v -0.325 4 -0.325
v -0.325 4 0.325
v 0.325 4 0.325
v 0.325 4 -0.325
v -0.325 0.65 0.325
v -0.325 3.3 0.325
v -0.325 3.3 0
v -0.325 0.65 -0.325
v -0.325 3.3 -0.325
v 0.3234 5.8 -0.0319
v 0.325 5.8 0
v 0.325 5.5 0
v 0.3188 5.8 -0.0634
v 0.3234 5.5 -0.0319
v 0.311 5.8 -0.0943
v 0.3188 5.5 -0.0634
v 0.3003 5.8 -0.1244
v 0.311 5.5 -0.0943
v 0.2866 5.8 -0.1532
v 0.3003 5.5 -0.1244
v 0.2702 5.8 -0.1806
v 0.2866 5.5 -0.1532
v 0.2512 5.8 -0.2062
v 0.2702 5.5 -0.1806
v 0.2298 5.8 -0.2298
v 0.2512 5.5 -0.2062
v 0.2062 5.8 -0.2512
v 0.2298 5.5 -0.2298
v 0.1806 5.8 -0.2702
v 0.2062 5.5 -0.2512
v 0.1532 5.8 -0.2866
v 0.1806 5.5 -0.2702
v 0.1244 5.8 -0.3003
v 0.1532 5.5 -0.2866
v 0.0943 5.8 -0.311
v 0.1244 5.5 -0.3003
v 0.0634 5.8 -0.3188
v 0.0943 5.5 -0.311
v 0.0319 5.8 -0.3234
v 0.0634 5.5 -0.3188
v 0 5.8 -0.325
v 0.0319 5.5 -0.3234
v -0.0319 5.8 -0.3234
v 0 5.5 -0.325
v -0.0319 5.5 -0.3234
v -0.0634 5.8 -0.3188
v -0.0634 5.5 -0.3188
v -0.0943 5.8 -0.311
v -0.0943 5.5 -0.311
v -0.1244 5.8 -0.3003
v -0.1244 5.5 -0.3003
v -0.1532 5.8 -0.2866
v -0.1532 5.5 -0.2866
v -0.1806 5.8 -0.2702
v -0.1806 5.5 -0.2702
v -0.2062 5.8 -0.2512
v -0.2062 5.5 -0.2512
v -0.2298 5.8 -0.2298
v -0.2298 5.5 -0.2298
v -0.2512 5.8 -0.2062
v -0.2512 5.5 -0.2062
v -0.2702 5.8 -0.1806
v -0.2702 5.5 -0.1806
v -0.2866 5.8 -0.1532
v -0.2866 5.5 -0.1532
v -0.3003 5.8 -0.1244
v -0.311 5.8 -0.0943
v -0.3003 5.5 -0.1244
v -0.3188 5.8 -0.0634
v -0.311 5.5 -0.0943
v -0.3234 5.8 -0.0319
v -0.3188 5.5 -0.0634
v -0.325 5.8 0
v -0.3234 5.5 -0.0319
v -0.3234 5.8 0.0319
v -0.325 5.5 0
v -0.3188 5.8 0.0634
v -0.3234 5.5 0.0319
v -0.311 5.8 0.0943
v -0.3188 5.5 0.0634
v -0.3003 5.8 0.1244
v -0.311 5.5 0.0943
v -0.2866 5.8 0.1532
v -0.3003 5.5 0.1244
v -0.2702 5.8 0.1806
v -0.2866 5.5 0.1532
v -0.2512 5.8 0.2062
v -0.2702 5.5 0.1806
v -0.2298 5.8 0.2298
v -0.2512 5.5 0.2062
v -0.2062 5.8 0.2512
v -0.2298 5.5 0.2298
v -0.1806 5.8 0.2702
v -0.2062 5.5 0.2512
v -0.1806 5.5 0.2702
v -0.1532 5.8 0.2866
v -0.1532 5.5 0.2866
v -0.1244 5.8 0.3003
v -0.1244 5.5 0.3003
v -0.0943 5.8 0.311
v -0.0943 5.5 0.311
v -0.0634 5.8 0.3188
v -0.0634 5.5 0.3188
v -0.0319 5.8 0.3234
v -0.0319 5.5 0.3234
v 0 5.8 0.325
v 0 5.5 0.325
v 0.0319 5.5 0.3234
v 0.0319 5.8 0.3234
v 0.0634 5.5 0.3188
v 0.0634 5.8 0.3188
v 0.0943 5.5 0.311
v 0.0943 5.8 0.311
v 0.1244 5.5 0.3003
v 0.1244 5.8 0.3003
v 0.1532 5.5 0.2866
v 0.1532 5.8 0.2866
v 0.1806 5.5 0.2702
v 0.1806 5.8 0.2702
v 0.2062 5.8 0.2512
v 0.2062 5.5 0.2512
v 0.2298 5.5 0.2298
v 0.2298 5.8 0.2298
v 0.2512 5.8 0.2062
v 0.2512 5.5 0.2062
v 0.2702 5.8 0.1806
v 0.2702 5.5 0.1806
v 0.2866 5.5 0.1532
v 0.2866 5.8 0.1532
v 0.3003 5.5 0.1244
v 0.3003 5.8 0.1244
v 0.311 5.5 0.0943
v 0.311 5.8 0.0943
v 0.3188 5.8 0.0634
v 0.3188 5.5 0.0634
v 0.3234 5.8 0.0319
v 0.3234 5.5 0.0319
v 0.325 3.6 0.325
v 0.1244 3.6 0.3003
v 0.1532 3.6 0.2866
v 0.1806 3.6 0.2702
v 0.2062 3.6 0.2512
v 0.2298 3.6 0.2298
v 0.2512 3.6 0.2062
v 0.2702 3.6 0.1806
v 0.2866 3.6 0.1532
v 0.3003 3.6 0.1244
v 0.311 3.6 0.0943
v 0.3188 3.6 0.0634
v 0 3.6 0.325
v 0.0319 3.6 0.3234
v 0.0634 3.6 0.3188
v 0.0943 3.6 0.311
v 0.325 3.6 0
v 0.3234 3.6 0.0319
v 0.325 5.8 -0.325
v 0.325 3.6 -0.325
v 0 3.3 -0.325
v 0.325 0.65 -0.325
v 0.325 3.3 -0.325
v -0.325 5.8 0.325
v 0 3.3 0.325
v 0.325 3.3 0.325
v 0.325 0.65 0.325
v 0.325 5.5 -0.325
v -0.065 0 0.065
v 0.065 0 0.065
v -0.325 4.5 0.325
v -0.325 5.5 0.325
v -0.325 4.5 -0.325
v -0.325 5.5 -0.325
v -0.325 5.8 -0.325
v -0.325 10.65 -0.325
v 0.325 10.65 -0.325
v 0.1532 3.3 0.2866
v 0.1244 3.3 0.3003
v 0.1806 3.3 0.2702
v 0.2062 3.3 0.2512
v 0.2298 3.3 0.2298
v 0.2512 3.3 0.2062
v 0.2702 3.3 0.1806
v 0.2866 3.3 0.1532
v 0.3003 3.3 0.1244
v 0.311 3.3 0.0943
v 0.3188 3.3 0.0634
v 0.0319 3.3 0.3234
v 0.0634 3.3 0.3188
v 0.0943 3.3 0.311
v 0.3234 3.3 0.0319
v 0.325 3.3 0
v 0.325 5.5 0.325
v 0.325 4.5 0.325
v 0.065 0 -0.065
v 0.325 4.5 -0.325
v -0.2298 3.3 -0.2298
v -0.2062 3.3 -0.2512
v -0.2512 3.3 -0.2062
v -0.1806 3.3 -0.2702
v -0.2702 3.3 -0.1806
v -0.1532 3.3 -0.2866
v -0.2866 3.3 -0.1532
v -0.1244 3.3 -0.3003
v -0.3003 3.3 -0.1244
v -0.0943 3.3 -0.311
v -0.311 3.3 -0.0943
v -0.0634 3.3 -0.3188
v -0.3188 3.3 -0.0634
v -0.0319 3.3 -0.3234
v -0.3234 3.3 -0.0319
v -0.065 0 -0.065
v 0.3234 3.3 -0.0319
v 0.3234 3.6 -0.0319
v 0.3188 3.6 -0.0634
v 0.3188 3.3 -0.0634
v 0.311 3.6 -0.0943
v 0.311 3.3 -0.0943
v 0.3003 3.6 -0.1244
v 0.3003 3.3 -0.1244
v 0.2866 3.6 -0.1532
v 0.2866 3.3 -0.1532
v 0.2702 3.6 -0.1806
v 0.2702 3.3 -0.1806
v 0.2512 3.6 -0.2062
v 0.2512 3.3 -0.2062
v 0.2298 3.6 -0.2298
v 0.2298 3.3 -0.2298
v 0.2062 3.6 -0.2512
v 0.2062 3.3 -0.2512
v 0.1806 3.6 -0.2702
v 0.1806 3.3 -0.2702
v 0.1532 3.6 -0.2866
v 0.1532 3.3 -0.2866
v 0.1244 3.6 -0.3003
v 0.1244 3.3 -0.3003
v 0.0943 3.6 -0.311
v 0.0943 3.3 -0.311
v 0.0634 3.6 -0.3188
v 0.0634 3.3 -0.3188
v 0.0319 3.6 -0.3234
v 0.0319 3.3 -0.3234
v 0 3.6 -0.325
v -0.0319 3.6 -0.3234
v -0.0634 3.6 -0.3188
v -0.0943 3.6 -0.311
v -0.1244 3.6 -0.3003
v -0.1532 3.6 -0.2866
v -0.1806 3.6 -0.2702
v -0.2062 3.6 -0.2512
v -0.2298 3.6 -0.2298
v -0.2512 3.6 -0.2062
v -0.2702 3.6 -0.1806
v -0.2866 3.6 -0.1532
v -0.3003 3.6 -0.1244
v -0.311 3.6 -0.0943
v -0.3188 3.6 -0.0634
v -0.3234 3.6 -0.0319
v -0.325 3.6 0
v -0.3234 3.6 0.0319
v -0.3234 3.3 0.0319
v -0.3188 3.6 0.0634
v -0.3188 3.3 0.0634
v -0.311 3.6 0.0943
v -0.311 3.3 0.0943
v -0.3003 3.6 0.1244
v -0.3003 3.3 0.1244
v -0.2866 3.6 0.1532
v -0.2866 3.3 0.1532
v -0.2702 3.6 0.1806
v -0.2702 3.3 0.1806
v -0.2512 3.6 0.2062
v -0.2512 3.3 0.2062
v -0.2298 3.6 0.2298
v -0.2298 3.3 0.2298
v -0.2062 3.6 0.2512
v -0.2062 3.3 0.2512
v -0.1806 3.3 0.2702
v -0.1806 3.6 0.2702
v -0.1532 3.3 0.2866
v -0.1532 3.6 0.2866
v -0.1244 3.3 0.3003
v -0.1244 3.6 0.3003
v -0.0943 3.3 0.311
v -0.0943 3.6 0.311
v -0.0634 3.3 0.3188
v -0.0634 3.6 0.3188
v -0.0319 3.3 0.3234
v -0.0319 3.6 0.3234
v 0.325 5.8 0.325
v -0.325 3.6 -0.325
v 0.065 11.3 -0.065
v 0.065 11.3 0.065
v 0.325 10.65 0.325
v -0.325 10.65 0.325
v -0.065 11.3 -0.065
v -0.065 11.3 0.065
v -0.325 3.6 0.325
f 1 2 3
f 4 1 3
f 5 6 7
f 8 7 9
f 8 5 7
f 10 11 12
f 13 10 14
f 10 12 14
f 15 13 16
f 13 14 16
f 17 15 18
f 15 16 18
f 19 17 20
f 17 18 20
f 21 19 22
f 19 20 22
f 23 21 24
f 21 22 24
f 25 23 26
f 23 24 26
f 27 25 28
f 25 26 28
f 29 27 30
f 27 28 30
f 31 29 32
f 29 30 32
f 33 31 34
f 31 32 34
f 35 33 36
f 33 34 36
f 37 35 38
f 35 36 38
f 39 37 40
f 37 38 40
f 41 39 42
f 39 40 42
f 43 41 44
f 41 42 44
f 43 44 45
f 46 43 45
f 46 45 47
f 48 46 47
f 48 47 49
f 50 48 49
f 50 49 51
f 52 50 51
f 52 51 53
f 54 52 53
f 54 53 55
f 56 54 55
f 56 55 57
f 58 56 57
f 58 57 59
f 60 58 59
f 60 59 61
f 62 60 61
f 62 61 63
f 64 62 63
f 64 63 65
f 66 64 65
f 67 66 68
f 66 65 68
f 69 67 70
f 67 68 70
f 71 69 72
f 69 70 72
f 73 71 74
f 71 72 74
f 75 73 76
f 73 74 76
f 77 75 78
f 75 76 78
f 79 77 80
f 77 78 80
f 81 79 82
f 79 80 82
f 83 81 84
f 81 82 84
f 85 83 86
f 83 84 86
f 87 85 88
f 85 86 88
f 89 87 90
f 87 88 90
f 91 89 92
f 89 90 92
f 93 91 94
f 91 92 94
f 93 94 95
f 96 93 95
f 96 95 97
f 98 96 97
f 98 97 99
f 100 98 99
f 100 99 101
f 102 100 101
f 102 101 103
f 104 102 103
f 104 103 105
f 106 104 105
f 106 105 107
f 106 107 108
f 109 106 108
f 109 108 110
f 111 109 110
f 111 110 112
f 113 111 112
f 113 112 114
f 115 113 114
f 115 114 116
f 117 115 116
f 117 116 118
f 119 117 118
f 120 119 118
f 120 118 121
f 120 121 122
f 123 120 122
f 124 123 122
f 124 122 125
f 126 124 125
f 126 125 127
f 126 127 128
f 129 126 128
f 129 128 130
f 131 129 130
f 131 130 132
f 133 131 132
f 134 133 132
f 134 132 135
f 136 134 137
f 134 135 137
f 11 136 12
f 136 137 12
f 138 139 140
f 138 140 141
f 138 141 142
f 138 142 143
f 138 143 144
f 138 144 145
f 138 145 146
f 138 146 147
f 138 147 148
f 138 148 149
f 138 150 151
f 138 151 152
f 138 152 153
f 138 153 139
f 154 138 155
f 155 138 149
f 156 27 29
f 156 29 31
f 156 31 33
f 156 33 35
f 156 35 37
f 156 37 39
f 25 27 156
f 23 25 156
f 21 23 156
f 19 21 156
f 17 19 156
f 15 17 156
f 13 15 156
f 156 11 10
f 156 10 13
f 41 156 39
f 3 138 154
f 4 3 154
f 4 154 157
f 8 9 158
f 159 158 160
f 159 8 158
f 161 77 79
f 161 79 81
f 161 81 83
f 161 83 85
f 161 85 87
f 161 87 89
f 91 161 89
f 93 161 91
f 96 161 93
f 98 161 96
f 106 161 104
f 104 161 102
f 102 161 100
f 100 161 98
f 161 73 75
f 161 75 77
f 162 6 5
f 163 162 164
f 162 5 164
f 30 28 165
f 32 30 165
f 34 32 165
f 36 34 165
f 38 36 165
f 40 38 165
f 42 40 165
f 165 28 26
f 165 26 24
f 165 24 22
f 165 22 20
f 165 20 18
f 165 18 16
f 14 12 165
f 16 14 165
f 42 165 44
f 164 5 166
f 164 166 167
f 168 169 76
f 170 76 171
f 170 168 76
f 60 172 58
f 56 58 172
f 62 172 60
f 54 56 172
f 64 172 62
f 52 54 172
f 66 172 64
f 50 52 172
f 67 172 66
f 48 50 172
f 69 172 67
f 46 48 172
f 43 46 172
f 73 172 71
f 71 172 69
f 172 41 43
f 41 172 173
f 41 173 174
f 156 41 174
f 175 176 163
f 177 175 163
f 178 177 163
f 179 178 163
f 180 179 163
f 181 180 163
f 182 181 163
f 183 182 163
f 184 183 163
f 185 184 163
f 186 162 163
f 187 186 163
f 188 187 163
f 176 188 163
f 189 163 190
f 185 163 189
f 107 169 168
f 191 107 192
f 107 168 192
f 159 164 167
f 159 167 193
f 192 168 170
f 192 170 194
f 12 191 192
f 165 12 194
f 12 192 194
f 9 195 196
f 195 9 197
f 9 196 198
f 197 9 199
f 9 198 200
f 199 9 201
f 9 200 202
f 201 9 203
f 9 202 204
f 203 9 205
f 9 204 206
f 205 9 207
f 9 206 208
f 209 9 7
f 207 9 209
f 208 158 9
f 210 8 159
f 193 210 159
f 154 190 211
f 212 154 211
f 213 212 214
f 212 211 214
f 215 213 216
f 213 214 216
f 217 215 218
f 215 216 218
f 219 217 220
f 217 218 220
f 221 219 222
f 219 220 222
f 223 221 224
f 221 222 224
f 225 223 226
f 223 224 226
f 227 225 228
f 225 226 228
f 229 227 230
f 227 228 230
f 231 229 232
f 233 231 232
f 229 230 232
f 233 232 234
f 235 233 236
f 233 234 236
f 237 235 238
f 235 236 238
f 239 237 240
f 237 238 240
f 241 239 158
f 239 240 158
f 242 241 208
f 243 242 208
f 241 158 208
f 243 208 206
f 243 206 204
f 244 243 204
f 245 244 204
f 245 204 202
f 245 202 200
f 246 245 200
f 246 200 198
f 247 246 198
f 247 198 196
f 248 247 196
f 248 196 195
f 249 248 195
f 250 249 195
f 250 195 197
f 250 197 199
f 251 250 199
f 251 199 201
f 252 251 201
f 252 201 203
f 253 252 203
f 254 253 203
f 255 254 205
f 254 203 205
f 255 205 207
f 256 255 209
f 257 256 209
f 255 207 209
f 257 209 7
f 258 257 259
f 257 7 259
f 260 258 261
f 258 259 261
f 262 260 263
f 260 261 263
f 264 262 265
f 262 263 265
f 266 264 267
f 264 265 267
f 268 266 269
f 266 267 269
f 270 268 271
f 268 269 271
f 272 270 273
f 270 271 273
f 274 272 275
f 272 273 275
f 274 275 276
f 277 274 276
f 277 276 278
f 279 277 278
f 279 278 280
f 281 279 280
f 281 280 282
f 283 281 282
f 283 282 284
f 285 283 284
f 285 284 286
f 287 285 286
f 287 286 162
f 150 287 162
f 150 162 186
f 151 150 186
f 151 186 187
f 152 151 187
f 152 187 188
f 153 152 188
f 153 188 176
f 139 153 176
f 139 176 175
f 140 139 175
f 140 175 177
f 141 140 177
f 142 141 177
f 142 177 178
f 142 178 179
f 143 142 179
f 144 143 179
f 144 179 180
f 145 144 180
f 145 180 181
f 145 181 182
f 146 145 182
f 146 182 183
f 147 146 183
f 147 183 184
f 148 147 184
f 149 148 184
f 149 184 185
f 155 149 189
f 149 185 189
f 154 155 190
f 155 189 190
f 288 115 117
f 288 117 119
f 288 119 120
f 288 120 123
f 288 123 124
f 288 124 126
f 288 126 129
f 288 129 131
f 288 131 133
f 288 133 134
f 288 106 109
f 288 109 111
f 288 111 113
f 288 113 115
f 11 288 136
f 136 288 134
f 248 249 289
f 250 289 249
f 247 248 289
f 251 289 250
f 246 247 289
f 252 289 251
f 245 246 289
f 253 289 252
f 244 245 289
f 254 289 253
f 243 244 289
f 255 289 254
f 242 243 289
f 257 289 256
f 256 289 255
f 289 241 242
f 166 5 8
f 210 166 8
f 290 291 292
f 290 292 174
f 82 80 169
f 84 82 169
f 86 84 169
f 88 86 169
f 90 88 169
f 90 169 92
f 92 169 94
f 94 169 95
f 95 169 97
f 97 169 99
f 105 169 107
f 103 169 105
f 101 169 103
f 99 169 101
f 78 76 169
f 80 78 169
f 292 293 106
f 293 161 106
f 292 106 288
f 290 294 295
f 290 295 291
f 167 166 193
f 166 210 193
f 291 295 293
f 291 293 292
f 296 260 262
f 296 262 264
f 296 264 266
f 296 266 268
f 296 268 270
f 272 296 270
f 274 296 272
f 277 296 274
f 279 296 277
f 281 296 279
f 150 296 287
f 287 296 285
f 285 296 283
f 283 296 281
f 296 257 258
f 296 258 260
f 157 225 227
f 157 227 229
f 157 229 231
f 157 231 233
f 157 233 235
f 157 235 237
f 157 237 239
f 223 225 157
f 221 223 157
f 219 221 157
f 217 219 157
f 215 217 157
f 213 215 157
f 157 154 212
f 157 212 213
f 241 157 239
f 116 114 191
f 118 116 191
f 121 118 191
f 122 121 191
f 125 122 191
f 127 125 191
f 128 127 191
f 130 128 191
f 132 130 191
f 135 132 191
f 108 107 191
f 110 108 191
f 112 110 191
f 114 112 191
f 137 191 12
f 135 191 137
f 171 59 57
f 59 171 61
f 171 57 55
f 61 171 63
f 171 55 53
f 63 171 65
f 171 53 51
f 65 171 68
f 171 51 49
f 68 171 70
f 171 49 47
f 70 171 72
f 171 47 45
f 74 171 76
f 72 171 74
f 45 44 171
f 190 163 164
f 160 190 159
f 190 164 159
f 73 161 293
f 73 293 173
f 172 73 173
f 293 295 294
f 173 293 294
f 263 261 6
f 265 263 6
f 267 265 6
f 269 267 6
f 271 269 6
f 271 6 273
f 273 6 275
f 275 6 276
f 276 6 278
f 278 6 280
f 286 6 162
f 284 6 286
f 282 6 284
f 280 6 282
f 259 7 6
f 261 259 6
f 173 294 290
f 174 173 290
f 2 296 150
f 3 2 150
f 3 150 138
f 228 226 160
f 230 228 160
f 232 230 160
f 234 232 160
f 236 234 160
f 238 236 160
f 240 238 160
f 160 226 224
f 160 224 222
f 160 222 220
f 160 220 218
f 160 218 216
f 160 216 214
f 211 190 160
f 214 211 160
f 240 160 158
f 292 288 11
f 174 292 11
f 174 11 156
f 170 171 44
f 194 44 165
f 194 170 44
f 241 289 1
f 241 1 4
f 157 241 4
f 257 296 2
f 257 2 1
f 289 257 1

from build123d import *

# Parameters (mm, degrees)
SKETCH2_W             = 0.65
SKETCH2_H             = 0.65
BOSS_EXTRUDE1_DEPTH   = 11.3
SKETCH6_W             = 0.65
SKETCH6_H             = 0.5
CUT_EXTRUDE1_DEPTH    = 1.65
SKETCH7_W             = 0.65
SKETCH7_H             = 0.3
CUT_EXTRUDE2_DEPTH    = 1.65
SKETCH8_R             = 0.325
BOSS_EXTRUDE2_DEPTH   = 0.3
SKETCH9_W             = 0.65
SKETCH9_H             = 0.3
CUT_EXTRUDE3_DEPTH    = 1.65
SKETCH10_R            = 0.325
BOSS_EXTRUDE3_DEPTH   = 0.3
CHAMFER1_SIZE         = 0.65
CHAMFER1_SIZE2        = 0.26
CHAMFER1_PART_2_SIZE  = 0.65
CHAMFER1_PART_2_SIZE2 = 0.26
CHAMFER1_PART_3_SIZE  = 0.65
CHAMFER1_PART_3_SIZE2 = 0.26
CHAMFER1_PART_4_SIZE  = 0.65
CHAMFER1_PART_4_SIZE2 = 0.26
CHAMFER2_SIZE         = 0.26
CHAMFER2_SIZE2        = 0.65


with BuildPart() as part:
    # Sketch2 → Boss-Extrude1 (new body)
    with BuildSketch(Plane(origin=(0, 0, 0), x_dir=(1, 0, 0), z_dir=(0, 1, 0))):
        Rectangle(SKETCH2_W, SKETCH2_H)
    extrude(amount=BOSS_EXTRUDE1_DEPTH)

    # Sketch6 → Cut-Extrude1 (cut, through all)
    with BuildSketch(Plane.XY.offset(0.325)):
        with Locations((0, 4.25)):
            Rectangle(SKETCH6_W, SKETCH6_H)
    extrude(amount=-CUT_EXTRUDE1_DEPTH, mode=Mode.SUBTRACT)

    # Sketch7 → Cut-Extrude2 (cut, through all)
    with BuildSketch(Plane.XY.offset(0.325)):
        with Locations((0, 3.45)):
            Rectangle(SKETCH7_W, SKETCH7_H)
    extrude(amount=-CUT_EXTRUDE2_DEPTH, mode=Mode.SUBTRACT)

    # Sketch8 → Boss-Extrude2 (add)
    with BuildSketch(Plane(origin=(0, 3.3, 0), x_dir=(1, 0, 0), z_dir=(0, 1, 0))):
        Circle(SKETCH8_R)
    extrude(amount=BOSS_EXTRUDE2_DEPTH)

    # Sketch9 → Cut-Extrude3 (cut, through all)
    with BuildSketch(Plane.XY.offset(0.325)):
        with Locations((0, 5.65)):
            Rectangle(SKETCH9_W, SKETCH9_H)
    extrude(amount=-CUT_EXTRUDE3_DEPTH, mode=Mode.SUBTRACT)

    # Sketch10 → Boss-Extrude3 (add)
    with BuildSketch(Plane(origin=(0, 5.5, 0), x_dir=(1, 0, 0), z_dir=(0, 1, 0))):
        Circle(SKETCH10_R)
    extrude(amount=BOSS_EXTRUDE3_DEPTH)

    # Chamfer1
    chamfer1_edges = [part.edges().sort_by_distance(p)[0] for p in [
        (0.325, 11.3, 0),
    ]]
    chamfer1_side = [part.faces().sort_by_distance(p)[0] for p in [
        (0.325, 8.55, 0),
    ]]
    chamfer(chamfer1_edges, length=CHAMFER1_SIZE, length2=CHAMFER1_SIZE2, reference=chamfer1_side[0])

    # Chamfer1 part 2
    chamfer1_part_2_edges = [part.edges().sort_by_distance(p)[0] for p in [
        (0, 11.3, -0.325),
    ]]
    chamfer1_part_2_side = [part.faces().sort_by_distance(p)[0] for p in [
        (0, 8.55, -0.325),
    ]]
    chamfer(chamfer1_part_2_edges, length=CHAMFER1_PART_2_SIZE, length2=CHAMFER1_PART_2_SIZE2, reference=chamfer1_part_2_side[0])

    # Chamfer1 part 3
    chamfer1_part_3_edges = [part.edges().sort_by_distance(p)[0] for p in [
        (-0.325, 11.3, 0),
    ]]
    chamfer1_part_3_side = [part.faces().sort_by_distance(p)[0] for p in [
        (-0.325, 8.55, 0),
    ]]
    chamfer(chamfer1_part_3_edges, length=CHAMFER1_PART_3_SIZE, length2=CHAMFER1_PART_3_SIZE2, reference=chamfer1_part_3_side[0])

    # Chamfer1 part 4
    chamfer1_part_4_edges = [part.edges().sort_by_distance(p)[0] for p in [
        (0, 11.3, 0.325),
    ]]
    chamfer1_part_4_side = [part.faces().sort_by_distance(p)[0] for p in [
        (0, 8.55, 0.325),
    ]]
    chamfer(chamfer1_part_4_edges, length=CHAMFER1_PART_4_SIZE, length2=CHAMFER1_PART_4_SIZE2, reference=chamfer1_part_4_side[0])

    # Chamfer2
    chamfer2_edges = [part.edges().sort_by_distance(p)[0] for p in [
        (0, 0, 0.325),
        (-0.325, 0, 0),
        (0, 0, -0.325),
        (0.325, 0, 0),
    ]]
    chamfer2_side = [part.faces().sort_by_distance(p)[0] for p in [
        (0, 0, 0),
    ]]
    chamfer(chamfer2_edges, length=CHAMFER2_SIZE, length2=CHAMFER2_SIZE2, reference=chamfer2_side[0])


solid = part.part
